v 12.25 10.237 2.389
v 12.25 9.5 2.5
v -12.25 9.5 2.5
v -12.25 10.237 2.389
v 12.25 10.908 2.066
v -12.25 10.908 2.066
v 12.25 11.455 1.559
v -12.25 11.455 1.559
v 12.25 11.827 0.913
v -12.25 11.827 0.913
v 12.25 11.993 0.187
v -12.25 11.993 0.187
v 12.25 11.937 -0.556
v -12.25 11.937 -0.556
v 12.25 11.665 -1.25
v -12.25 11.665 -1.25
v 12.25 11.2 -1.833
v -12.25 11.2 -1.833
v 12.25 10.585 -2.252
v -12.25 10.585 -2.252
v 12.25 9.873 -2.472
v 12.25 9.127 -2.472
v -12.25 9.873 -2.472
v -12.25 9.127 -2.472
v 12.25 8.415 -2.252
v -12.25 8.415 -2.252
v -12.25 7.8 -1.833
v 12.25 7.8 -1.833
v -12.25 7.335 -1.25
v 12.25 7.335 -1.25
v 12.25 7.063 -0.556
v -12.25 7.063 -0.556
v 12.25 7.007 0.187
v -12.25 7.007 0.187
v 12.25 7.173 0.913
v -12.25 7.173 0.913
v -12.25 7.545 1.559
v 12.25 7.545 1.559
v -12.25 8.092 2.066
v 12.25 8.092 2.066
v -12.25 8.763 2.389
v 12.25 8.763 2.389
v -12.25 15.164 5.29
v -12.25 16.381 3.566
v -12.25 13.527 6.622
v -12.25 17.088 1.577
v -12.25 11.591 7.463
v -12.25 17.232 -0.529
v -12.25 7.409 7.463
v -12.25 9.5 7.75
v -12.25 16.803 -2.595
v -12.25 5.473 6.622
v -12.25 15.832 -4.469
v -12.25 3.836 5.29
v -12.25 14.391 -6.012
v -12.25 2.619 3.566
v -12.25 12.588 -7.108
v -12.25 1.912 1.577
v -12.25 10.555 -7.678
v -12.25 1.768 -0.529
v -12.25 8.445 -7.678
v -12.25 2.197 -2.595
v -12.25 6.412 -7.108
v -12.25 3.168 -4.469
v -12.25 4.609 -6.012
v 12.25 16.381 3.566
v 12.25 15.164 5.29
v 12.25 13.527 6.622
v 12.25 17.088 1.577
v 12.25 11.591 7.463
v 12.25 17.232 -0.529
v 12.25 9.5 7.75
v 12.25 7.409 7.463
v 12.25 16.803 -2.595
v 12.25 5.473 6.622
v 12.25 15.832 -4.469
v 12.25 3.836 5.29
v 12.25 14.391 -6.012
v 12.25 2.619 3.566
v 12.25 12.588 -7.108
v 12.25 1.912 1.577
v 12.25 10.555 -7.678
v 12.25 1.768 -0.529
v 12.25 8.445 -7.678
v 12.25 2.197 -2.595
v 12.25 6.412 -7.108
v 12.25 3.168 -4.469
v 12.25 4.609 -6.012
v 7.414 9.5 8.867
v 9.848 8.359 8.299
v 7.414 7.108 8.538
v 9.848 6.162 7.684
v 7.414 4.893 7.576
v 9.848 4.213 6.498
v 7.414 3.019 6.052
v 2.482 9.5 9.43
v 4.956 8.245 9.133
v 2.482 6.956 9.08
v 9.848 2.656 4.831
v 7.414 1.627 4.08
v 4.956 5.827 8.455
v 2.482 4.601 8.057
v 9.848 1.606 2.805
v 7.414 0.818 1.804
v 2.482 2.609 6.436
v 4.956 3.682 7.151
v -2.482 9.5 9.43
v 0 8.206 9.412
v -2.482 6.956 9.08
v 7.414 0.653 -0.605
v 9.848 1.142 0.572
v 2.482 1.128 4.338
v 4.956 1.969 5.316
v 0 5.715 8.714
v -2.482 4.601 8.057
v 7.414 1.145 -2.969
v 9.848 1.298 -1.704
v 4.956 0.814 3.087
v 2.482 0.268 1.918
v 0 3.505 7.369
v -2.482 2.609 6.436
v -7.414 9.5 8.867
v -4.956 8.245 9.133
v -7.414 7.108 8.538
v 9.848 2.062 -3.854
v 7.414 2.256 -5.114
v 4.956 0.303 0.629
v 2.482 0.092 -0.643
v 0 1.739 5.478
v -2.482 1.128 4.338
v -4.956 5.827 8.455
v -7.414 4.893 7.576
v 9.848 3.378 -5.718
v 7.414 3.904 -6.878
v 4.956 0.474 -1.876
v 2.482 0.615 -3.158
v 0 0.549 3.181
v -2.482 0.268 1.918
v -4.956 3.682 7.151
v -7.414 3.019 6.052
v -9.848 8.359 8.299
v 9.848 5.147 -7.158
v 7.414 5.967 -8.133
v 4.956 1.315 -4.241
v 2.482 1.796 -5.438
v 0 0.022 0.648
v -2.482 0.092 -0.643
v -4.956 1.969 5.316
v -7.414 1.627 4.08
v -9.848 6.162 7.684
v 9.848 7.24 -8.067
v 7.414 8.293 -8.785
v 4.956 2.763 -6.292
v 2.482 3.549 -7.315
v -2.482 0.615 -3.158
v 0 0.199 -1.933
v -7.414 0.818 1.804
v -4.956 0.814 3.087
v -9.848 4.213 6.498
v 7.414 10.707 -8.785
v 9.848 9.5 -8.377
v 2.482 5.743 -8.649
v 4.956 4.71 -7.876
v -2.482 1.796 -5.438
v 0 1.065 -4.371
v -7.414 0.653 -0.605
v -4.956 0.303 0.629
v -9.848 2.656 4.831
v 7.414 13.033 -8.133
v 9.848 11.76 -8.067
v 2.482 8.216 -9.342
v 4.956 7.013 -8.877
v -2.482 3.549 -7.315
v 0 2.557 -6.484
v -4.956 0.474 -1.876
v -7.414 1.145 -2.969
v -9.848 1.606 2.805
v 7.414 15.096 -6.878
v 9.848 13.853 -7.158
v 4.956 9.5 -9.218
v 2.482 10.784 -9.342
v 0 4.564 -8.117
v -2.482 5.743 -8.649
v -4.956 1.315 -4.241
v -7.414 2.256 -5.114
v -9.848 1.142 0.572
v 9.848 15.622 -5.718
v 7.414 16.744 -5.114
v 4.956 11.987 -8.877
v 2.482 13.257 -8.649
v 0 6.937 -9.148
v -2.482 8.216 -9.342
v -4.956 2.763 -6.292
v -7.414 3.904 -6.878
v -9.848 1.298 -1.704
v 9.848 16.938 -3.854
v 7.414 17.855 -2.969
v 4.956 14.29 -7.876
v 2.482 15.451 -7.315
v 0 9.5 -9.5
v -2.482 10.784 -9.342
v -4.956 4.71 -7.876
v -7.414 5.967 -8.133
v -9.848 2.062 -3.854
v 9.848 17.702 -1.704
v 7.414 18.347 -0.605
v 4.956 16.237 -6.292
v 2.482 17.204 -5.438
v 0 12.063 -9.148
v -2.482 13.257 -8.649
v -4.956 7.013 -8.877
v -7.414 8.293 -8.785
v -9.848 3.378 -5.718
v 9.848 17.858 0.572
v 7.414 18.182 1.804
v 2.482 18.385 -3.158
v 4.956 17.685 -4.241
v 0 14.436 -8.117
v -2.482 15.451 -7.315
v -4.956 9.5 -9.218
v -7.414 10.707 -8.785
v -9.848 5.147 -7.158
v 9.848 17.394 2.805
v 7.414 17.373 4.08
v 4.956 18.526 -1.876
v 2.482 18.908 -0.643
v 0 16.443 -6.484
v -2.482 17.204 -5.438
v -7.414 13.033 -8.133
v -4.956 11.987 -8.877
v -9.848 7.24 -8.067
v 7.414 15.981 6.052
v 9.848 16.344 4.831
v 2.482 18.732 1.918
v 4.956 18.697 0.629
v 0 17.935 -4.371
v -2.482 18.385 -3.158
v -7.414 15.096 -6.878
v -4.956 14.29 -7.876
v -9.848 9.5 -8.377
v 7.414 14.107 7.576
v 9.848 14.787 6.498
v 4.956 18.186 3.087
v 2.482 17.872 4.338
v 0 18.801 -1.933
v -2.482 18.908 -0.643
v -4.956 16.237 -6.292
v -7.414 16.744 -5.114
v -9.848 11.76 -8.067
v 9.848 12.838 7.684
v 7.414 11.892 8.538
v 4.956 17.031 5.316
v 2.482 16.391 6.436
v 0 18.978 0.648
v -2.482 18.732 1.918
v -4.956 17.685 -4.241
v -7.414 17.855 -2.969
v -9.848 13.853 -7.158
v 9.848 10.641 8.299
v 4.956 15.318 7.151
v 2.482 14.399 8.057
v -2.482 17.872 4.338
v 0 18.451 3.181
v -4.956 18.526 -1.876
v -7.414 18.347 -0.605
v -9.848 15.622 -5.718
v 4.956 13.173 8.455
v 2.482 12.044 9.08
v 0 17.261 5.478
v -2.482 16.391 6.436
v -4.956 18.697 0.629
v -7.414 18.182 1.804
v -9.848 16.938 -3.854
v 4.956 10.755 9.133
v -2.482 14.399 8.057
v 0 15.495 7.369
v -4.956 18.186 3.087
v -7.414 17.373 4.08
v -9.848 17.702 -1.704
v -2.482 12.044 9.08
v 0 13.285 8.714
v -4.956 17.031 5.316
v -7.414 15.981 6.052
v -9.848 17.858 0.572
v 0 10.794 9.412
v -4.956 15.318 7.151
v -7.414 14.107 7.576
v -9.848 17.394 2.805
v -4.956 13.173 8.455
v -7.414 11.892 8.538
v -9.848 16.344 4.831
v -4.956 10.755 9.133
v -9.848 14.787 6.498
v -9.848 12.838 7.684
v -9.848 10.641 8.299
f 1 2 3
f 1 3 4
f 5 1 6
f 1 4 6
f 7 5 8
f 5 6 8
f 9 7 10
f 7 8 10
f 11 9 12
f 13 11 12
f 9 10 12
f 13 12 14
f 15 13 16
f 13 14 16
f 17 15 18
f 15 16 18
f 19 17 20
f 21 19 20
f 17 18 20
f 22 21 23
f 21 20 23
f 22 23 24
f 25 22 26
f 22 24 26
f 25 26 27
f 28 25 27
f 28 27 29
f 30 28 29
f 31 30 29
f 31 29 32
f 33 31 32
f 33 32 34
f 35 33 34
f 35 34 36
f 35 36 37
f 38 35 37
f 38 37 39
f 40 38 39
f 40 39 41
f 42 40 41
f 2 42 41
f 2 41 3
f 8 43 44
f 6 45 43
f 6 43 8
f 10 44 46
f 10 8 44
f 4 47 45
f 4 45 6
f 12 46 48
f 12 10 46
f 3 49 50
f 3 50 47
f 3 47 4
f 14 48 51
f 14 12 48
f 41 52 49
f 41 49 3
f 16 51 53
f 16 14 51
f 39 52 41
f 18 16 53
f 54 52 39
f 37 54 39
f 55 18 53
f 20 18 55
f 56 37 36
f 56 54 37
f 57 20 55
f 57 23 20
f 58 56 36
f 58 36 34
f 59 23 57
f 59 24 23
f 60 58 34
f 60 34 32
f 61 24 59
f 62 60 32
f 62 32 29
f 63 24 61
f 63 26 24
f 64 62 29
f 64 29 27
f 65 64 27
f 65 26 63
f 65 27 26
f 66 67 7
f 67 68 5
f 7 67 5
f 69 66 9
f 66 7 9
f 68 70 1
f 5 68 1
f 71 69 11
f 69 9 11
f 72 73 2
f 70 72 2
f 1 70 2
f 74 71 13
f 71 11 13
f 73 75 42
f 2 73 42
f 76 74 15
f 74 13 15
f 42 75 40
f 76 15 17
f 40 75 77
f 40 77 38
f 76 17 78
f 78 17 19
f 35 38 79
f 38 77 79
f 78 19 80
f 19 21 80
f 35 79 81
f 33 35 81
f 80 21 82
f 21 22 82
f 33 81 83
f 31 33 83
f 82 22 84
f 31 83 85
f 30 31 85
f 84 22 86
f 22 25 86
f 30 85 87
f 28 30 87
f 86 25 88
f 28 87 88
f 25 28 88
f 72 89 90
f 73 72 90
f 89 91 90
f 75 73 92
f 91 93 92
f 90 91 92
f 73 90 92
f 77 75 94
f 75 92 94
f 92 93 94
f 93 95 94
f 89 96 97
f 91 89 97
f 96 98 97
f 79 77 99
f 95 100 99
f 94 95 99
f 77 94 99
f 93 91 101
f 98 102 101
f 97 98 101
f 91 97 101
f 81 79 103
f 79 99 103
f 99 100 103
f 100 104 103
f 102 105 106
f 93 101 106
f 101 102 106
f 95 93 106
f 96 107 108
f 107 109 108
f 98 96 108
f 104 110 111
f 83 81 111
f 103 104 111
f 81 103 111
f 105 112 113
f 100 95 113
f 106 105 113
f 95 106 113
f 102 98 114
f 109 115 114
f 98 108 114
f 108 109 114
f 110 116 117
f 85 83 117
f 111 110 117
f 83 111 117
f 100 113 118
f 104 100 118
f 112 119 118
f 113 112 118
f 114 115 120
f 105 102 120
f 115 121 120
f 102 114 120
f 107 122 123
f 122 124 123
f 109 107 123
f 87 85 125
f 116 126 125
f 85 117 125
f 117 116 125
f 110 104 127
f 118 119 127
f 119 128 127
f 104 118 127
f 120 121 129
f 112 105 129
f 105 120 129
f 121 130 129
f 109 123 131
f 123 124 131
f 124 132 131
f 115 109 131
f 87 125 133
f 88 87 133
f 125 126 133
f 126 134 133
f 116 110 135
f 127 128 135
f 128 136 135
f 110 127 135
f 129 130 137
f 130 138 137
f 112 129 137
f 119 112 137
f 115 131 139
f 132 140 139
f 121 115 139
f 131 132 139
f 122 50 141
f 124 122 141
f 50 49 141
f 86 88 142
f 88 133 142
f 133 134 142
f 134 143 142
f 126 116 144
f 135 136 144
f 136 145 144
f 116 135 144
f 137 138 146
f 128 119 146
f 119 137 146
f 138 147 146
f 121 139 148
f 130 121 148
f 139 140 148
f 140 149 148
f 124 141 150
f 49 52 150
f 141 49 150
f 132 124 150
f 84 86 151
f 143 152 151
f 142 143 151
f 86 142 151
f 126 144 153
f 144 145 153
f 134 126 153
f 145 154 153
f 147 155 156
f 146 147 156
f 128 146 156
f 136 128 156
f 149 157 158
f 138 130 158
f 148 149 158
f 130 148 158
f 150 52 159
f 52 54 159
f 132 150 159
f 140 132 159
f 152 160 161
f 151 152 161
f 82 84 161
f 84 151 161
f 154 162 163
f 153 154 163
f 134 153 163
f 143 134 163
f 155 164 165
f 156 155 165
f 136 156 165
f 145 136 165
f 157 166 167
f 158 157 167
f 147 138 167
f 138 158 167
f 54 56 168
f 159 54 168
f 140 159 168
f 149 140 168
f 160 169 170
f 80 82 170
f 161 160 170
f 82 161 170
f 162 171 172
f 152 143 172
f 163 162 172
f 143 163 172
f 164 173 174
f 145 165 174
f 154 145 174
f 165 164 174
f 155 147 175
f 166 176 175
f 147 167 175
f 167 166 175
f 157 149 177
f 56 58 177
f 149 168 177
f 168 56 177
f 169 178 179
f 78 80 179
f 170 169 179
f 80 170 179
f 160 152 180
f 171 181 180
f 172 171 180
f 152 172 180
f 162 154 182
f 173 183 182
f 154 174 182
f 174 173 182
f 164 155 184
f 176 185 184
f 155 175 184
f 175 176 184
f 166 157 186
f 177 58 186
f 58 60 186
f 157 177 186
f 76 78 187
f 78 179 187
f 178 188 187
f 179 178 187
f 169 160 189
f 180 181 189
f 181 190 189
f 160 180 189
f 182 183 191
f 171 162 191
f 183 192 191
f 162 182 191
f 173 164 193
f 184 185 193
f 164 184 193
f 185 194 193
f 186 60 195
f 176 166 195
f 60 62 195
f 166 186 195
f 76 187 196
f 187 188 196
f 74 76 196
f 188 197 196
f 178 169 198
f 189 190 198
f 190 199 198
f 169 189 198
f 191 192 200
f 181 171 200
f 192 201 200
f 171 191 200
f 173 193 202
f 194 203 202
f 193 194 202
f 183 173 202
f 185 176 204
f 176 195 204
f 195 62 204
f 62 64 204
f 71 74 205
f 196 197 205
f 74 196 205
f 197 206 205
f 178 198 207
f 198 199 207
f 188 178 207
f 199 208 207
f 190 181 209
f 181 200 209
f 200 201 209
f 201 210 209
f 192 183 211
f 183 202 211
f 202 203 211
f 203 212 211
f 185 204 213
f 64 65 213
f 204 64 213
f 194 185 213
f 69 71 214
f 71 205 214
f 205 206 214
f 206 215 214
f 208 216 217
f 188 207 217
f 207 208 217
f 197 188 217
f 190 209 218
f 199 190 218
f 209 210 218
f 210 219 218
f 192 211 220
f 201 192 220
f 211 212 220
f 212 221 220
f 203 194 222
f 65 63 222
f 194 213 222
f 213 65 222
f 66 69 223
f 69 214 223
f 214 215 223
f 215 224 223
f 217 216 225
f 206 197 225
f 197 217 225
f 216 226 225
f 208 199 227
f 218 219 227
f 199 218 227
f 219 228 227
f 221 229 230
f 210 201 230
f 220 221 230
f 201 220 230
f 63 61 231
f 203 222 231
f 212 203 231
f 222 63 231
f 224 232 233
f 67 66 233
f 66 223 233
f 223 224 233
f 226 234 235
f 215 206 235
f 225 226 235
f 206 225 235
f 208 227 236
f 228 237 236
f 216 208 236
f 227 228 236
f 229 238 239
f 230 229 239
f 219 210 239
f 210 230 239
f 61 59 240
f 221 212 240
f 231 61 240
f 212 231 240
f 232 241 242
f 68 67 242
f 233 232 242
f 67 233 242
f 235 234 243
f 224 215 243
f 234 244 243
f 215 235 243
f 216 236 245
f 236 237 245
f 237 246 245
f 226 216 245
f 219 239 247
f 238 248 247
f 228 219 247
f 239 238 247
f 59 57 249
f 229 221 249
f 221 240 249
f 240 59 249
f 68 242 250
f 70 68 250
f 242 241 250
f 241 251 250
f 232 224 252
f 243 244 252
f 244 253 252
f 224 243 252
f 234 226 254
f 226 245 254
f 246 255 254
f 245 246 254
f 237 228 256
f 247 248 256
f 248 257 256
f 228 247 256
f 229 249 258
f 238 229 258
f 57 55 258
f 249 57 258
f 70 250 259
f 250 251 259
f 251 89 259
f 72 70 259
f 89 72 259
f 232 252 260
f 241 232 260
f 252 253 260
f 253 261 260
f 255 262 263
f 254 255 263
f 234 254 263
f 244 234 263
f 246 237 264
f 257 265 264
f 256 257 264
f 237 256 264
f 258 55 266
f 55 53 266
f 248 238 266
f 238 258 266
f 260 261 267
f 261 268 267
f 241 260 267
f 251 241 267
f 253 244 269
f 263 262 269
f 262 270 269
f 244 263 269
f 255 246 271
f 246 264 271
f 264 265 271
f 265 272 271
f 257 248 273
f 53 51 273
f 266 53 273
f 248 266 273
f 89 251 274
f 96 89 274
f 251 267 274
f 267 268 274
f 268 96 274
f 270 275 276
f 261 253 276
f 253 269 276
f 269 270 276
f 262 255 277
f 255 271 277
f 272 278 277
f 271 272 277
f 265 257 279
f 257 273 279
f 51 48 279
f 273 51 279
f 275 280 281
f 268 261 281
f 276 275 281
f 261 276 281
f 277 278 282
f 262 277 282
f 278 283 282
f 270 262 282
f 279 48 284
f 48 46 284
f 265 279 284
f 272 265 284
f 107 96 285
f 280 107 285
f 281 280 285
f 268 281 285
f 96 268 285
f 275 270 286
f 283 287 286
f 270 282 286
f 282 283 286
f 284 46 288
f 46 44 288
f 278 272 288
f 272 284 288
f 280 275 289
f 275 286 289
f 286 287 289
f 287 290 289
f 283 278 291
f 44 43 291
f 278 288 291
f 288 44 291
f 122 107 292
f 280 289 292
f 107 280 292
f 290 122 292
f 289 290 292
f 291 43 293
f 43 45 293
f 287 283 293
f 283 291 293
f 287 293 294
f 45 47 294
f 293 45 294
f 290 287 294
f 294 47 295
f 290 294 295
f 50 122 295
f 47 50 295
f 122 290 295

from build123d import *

# Parameters (mm, degrees)
CROQUIS1_W              = 24.5
CROQUIS1_H              = 19
SALIENTE_EXTRUIR1_DEPTH = 19
CROQUIS4_R              = 2.5
CORTAR_EXTRUIR1_DEPTH   = 34.5


with BuildPart() as part:
    # Croquis1 → Saliente-Extruir1 (new body)
    with BuildSketch(Plane(origin=(0, 0, 0), x_dir=(1, 0, 0), z_dir=(0, 1, 0))):
        Rectangle(CROQUIS1_W, CROQUIS1_H)
    extrude(amount=SALIENTE_EXTRUIR1_DEPTH)

    # Croquis2 → Cortar-Revolución2 (revolve, cut)
    with BuildSketch(Plane(origin=(0, 9.5, 0), x_dir=(1, 0, 0), z_dir=(0, 1, 0)), mode=Mode.PRIVATE) as cortar_revoluci_n2_sk:
        with BuildLine():
            Line((-12.25, 7.75), (-12.25, 18.221479362))
            Line((-12.25, 18.221479362), (12.25, 18.221479362))
            Line((12.25, 18.221479362), (12.25, 7.75))
            ThreePointArc((12.25, 7.75), (0, 9.5), (-12.25, 7.75))
        make_face()
    revolve(cortar_revoluci_n2_sk.sketch.rotate(Axis((-13.475, 9.5, 0), (1, 0, 0)), 180), axis=Axis((-13.475, 9.5, 0), (1, 0, 0)), mode=Mode.SUBTRACT)

    # Croquis4 → Cortar-Extruir1 (cut)
    with BuildSketch(Plane.ZY.offset(12.25)):
        with Locations((0, 9.5)):
            Circle(CROQUIS4_R)
    extrude(amount=-CORTAR_EXTRUIR1_DEPTH, mode=Mode.SUBTRACT)


solid = part.part
